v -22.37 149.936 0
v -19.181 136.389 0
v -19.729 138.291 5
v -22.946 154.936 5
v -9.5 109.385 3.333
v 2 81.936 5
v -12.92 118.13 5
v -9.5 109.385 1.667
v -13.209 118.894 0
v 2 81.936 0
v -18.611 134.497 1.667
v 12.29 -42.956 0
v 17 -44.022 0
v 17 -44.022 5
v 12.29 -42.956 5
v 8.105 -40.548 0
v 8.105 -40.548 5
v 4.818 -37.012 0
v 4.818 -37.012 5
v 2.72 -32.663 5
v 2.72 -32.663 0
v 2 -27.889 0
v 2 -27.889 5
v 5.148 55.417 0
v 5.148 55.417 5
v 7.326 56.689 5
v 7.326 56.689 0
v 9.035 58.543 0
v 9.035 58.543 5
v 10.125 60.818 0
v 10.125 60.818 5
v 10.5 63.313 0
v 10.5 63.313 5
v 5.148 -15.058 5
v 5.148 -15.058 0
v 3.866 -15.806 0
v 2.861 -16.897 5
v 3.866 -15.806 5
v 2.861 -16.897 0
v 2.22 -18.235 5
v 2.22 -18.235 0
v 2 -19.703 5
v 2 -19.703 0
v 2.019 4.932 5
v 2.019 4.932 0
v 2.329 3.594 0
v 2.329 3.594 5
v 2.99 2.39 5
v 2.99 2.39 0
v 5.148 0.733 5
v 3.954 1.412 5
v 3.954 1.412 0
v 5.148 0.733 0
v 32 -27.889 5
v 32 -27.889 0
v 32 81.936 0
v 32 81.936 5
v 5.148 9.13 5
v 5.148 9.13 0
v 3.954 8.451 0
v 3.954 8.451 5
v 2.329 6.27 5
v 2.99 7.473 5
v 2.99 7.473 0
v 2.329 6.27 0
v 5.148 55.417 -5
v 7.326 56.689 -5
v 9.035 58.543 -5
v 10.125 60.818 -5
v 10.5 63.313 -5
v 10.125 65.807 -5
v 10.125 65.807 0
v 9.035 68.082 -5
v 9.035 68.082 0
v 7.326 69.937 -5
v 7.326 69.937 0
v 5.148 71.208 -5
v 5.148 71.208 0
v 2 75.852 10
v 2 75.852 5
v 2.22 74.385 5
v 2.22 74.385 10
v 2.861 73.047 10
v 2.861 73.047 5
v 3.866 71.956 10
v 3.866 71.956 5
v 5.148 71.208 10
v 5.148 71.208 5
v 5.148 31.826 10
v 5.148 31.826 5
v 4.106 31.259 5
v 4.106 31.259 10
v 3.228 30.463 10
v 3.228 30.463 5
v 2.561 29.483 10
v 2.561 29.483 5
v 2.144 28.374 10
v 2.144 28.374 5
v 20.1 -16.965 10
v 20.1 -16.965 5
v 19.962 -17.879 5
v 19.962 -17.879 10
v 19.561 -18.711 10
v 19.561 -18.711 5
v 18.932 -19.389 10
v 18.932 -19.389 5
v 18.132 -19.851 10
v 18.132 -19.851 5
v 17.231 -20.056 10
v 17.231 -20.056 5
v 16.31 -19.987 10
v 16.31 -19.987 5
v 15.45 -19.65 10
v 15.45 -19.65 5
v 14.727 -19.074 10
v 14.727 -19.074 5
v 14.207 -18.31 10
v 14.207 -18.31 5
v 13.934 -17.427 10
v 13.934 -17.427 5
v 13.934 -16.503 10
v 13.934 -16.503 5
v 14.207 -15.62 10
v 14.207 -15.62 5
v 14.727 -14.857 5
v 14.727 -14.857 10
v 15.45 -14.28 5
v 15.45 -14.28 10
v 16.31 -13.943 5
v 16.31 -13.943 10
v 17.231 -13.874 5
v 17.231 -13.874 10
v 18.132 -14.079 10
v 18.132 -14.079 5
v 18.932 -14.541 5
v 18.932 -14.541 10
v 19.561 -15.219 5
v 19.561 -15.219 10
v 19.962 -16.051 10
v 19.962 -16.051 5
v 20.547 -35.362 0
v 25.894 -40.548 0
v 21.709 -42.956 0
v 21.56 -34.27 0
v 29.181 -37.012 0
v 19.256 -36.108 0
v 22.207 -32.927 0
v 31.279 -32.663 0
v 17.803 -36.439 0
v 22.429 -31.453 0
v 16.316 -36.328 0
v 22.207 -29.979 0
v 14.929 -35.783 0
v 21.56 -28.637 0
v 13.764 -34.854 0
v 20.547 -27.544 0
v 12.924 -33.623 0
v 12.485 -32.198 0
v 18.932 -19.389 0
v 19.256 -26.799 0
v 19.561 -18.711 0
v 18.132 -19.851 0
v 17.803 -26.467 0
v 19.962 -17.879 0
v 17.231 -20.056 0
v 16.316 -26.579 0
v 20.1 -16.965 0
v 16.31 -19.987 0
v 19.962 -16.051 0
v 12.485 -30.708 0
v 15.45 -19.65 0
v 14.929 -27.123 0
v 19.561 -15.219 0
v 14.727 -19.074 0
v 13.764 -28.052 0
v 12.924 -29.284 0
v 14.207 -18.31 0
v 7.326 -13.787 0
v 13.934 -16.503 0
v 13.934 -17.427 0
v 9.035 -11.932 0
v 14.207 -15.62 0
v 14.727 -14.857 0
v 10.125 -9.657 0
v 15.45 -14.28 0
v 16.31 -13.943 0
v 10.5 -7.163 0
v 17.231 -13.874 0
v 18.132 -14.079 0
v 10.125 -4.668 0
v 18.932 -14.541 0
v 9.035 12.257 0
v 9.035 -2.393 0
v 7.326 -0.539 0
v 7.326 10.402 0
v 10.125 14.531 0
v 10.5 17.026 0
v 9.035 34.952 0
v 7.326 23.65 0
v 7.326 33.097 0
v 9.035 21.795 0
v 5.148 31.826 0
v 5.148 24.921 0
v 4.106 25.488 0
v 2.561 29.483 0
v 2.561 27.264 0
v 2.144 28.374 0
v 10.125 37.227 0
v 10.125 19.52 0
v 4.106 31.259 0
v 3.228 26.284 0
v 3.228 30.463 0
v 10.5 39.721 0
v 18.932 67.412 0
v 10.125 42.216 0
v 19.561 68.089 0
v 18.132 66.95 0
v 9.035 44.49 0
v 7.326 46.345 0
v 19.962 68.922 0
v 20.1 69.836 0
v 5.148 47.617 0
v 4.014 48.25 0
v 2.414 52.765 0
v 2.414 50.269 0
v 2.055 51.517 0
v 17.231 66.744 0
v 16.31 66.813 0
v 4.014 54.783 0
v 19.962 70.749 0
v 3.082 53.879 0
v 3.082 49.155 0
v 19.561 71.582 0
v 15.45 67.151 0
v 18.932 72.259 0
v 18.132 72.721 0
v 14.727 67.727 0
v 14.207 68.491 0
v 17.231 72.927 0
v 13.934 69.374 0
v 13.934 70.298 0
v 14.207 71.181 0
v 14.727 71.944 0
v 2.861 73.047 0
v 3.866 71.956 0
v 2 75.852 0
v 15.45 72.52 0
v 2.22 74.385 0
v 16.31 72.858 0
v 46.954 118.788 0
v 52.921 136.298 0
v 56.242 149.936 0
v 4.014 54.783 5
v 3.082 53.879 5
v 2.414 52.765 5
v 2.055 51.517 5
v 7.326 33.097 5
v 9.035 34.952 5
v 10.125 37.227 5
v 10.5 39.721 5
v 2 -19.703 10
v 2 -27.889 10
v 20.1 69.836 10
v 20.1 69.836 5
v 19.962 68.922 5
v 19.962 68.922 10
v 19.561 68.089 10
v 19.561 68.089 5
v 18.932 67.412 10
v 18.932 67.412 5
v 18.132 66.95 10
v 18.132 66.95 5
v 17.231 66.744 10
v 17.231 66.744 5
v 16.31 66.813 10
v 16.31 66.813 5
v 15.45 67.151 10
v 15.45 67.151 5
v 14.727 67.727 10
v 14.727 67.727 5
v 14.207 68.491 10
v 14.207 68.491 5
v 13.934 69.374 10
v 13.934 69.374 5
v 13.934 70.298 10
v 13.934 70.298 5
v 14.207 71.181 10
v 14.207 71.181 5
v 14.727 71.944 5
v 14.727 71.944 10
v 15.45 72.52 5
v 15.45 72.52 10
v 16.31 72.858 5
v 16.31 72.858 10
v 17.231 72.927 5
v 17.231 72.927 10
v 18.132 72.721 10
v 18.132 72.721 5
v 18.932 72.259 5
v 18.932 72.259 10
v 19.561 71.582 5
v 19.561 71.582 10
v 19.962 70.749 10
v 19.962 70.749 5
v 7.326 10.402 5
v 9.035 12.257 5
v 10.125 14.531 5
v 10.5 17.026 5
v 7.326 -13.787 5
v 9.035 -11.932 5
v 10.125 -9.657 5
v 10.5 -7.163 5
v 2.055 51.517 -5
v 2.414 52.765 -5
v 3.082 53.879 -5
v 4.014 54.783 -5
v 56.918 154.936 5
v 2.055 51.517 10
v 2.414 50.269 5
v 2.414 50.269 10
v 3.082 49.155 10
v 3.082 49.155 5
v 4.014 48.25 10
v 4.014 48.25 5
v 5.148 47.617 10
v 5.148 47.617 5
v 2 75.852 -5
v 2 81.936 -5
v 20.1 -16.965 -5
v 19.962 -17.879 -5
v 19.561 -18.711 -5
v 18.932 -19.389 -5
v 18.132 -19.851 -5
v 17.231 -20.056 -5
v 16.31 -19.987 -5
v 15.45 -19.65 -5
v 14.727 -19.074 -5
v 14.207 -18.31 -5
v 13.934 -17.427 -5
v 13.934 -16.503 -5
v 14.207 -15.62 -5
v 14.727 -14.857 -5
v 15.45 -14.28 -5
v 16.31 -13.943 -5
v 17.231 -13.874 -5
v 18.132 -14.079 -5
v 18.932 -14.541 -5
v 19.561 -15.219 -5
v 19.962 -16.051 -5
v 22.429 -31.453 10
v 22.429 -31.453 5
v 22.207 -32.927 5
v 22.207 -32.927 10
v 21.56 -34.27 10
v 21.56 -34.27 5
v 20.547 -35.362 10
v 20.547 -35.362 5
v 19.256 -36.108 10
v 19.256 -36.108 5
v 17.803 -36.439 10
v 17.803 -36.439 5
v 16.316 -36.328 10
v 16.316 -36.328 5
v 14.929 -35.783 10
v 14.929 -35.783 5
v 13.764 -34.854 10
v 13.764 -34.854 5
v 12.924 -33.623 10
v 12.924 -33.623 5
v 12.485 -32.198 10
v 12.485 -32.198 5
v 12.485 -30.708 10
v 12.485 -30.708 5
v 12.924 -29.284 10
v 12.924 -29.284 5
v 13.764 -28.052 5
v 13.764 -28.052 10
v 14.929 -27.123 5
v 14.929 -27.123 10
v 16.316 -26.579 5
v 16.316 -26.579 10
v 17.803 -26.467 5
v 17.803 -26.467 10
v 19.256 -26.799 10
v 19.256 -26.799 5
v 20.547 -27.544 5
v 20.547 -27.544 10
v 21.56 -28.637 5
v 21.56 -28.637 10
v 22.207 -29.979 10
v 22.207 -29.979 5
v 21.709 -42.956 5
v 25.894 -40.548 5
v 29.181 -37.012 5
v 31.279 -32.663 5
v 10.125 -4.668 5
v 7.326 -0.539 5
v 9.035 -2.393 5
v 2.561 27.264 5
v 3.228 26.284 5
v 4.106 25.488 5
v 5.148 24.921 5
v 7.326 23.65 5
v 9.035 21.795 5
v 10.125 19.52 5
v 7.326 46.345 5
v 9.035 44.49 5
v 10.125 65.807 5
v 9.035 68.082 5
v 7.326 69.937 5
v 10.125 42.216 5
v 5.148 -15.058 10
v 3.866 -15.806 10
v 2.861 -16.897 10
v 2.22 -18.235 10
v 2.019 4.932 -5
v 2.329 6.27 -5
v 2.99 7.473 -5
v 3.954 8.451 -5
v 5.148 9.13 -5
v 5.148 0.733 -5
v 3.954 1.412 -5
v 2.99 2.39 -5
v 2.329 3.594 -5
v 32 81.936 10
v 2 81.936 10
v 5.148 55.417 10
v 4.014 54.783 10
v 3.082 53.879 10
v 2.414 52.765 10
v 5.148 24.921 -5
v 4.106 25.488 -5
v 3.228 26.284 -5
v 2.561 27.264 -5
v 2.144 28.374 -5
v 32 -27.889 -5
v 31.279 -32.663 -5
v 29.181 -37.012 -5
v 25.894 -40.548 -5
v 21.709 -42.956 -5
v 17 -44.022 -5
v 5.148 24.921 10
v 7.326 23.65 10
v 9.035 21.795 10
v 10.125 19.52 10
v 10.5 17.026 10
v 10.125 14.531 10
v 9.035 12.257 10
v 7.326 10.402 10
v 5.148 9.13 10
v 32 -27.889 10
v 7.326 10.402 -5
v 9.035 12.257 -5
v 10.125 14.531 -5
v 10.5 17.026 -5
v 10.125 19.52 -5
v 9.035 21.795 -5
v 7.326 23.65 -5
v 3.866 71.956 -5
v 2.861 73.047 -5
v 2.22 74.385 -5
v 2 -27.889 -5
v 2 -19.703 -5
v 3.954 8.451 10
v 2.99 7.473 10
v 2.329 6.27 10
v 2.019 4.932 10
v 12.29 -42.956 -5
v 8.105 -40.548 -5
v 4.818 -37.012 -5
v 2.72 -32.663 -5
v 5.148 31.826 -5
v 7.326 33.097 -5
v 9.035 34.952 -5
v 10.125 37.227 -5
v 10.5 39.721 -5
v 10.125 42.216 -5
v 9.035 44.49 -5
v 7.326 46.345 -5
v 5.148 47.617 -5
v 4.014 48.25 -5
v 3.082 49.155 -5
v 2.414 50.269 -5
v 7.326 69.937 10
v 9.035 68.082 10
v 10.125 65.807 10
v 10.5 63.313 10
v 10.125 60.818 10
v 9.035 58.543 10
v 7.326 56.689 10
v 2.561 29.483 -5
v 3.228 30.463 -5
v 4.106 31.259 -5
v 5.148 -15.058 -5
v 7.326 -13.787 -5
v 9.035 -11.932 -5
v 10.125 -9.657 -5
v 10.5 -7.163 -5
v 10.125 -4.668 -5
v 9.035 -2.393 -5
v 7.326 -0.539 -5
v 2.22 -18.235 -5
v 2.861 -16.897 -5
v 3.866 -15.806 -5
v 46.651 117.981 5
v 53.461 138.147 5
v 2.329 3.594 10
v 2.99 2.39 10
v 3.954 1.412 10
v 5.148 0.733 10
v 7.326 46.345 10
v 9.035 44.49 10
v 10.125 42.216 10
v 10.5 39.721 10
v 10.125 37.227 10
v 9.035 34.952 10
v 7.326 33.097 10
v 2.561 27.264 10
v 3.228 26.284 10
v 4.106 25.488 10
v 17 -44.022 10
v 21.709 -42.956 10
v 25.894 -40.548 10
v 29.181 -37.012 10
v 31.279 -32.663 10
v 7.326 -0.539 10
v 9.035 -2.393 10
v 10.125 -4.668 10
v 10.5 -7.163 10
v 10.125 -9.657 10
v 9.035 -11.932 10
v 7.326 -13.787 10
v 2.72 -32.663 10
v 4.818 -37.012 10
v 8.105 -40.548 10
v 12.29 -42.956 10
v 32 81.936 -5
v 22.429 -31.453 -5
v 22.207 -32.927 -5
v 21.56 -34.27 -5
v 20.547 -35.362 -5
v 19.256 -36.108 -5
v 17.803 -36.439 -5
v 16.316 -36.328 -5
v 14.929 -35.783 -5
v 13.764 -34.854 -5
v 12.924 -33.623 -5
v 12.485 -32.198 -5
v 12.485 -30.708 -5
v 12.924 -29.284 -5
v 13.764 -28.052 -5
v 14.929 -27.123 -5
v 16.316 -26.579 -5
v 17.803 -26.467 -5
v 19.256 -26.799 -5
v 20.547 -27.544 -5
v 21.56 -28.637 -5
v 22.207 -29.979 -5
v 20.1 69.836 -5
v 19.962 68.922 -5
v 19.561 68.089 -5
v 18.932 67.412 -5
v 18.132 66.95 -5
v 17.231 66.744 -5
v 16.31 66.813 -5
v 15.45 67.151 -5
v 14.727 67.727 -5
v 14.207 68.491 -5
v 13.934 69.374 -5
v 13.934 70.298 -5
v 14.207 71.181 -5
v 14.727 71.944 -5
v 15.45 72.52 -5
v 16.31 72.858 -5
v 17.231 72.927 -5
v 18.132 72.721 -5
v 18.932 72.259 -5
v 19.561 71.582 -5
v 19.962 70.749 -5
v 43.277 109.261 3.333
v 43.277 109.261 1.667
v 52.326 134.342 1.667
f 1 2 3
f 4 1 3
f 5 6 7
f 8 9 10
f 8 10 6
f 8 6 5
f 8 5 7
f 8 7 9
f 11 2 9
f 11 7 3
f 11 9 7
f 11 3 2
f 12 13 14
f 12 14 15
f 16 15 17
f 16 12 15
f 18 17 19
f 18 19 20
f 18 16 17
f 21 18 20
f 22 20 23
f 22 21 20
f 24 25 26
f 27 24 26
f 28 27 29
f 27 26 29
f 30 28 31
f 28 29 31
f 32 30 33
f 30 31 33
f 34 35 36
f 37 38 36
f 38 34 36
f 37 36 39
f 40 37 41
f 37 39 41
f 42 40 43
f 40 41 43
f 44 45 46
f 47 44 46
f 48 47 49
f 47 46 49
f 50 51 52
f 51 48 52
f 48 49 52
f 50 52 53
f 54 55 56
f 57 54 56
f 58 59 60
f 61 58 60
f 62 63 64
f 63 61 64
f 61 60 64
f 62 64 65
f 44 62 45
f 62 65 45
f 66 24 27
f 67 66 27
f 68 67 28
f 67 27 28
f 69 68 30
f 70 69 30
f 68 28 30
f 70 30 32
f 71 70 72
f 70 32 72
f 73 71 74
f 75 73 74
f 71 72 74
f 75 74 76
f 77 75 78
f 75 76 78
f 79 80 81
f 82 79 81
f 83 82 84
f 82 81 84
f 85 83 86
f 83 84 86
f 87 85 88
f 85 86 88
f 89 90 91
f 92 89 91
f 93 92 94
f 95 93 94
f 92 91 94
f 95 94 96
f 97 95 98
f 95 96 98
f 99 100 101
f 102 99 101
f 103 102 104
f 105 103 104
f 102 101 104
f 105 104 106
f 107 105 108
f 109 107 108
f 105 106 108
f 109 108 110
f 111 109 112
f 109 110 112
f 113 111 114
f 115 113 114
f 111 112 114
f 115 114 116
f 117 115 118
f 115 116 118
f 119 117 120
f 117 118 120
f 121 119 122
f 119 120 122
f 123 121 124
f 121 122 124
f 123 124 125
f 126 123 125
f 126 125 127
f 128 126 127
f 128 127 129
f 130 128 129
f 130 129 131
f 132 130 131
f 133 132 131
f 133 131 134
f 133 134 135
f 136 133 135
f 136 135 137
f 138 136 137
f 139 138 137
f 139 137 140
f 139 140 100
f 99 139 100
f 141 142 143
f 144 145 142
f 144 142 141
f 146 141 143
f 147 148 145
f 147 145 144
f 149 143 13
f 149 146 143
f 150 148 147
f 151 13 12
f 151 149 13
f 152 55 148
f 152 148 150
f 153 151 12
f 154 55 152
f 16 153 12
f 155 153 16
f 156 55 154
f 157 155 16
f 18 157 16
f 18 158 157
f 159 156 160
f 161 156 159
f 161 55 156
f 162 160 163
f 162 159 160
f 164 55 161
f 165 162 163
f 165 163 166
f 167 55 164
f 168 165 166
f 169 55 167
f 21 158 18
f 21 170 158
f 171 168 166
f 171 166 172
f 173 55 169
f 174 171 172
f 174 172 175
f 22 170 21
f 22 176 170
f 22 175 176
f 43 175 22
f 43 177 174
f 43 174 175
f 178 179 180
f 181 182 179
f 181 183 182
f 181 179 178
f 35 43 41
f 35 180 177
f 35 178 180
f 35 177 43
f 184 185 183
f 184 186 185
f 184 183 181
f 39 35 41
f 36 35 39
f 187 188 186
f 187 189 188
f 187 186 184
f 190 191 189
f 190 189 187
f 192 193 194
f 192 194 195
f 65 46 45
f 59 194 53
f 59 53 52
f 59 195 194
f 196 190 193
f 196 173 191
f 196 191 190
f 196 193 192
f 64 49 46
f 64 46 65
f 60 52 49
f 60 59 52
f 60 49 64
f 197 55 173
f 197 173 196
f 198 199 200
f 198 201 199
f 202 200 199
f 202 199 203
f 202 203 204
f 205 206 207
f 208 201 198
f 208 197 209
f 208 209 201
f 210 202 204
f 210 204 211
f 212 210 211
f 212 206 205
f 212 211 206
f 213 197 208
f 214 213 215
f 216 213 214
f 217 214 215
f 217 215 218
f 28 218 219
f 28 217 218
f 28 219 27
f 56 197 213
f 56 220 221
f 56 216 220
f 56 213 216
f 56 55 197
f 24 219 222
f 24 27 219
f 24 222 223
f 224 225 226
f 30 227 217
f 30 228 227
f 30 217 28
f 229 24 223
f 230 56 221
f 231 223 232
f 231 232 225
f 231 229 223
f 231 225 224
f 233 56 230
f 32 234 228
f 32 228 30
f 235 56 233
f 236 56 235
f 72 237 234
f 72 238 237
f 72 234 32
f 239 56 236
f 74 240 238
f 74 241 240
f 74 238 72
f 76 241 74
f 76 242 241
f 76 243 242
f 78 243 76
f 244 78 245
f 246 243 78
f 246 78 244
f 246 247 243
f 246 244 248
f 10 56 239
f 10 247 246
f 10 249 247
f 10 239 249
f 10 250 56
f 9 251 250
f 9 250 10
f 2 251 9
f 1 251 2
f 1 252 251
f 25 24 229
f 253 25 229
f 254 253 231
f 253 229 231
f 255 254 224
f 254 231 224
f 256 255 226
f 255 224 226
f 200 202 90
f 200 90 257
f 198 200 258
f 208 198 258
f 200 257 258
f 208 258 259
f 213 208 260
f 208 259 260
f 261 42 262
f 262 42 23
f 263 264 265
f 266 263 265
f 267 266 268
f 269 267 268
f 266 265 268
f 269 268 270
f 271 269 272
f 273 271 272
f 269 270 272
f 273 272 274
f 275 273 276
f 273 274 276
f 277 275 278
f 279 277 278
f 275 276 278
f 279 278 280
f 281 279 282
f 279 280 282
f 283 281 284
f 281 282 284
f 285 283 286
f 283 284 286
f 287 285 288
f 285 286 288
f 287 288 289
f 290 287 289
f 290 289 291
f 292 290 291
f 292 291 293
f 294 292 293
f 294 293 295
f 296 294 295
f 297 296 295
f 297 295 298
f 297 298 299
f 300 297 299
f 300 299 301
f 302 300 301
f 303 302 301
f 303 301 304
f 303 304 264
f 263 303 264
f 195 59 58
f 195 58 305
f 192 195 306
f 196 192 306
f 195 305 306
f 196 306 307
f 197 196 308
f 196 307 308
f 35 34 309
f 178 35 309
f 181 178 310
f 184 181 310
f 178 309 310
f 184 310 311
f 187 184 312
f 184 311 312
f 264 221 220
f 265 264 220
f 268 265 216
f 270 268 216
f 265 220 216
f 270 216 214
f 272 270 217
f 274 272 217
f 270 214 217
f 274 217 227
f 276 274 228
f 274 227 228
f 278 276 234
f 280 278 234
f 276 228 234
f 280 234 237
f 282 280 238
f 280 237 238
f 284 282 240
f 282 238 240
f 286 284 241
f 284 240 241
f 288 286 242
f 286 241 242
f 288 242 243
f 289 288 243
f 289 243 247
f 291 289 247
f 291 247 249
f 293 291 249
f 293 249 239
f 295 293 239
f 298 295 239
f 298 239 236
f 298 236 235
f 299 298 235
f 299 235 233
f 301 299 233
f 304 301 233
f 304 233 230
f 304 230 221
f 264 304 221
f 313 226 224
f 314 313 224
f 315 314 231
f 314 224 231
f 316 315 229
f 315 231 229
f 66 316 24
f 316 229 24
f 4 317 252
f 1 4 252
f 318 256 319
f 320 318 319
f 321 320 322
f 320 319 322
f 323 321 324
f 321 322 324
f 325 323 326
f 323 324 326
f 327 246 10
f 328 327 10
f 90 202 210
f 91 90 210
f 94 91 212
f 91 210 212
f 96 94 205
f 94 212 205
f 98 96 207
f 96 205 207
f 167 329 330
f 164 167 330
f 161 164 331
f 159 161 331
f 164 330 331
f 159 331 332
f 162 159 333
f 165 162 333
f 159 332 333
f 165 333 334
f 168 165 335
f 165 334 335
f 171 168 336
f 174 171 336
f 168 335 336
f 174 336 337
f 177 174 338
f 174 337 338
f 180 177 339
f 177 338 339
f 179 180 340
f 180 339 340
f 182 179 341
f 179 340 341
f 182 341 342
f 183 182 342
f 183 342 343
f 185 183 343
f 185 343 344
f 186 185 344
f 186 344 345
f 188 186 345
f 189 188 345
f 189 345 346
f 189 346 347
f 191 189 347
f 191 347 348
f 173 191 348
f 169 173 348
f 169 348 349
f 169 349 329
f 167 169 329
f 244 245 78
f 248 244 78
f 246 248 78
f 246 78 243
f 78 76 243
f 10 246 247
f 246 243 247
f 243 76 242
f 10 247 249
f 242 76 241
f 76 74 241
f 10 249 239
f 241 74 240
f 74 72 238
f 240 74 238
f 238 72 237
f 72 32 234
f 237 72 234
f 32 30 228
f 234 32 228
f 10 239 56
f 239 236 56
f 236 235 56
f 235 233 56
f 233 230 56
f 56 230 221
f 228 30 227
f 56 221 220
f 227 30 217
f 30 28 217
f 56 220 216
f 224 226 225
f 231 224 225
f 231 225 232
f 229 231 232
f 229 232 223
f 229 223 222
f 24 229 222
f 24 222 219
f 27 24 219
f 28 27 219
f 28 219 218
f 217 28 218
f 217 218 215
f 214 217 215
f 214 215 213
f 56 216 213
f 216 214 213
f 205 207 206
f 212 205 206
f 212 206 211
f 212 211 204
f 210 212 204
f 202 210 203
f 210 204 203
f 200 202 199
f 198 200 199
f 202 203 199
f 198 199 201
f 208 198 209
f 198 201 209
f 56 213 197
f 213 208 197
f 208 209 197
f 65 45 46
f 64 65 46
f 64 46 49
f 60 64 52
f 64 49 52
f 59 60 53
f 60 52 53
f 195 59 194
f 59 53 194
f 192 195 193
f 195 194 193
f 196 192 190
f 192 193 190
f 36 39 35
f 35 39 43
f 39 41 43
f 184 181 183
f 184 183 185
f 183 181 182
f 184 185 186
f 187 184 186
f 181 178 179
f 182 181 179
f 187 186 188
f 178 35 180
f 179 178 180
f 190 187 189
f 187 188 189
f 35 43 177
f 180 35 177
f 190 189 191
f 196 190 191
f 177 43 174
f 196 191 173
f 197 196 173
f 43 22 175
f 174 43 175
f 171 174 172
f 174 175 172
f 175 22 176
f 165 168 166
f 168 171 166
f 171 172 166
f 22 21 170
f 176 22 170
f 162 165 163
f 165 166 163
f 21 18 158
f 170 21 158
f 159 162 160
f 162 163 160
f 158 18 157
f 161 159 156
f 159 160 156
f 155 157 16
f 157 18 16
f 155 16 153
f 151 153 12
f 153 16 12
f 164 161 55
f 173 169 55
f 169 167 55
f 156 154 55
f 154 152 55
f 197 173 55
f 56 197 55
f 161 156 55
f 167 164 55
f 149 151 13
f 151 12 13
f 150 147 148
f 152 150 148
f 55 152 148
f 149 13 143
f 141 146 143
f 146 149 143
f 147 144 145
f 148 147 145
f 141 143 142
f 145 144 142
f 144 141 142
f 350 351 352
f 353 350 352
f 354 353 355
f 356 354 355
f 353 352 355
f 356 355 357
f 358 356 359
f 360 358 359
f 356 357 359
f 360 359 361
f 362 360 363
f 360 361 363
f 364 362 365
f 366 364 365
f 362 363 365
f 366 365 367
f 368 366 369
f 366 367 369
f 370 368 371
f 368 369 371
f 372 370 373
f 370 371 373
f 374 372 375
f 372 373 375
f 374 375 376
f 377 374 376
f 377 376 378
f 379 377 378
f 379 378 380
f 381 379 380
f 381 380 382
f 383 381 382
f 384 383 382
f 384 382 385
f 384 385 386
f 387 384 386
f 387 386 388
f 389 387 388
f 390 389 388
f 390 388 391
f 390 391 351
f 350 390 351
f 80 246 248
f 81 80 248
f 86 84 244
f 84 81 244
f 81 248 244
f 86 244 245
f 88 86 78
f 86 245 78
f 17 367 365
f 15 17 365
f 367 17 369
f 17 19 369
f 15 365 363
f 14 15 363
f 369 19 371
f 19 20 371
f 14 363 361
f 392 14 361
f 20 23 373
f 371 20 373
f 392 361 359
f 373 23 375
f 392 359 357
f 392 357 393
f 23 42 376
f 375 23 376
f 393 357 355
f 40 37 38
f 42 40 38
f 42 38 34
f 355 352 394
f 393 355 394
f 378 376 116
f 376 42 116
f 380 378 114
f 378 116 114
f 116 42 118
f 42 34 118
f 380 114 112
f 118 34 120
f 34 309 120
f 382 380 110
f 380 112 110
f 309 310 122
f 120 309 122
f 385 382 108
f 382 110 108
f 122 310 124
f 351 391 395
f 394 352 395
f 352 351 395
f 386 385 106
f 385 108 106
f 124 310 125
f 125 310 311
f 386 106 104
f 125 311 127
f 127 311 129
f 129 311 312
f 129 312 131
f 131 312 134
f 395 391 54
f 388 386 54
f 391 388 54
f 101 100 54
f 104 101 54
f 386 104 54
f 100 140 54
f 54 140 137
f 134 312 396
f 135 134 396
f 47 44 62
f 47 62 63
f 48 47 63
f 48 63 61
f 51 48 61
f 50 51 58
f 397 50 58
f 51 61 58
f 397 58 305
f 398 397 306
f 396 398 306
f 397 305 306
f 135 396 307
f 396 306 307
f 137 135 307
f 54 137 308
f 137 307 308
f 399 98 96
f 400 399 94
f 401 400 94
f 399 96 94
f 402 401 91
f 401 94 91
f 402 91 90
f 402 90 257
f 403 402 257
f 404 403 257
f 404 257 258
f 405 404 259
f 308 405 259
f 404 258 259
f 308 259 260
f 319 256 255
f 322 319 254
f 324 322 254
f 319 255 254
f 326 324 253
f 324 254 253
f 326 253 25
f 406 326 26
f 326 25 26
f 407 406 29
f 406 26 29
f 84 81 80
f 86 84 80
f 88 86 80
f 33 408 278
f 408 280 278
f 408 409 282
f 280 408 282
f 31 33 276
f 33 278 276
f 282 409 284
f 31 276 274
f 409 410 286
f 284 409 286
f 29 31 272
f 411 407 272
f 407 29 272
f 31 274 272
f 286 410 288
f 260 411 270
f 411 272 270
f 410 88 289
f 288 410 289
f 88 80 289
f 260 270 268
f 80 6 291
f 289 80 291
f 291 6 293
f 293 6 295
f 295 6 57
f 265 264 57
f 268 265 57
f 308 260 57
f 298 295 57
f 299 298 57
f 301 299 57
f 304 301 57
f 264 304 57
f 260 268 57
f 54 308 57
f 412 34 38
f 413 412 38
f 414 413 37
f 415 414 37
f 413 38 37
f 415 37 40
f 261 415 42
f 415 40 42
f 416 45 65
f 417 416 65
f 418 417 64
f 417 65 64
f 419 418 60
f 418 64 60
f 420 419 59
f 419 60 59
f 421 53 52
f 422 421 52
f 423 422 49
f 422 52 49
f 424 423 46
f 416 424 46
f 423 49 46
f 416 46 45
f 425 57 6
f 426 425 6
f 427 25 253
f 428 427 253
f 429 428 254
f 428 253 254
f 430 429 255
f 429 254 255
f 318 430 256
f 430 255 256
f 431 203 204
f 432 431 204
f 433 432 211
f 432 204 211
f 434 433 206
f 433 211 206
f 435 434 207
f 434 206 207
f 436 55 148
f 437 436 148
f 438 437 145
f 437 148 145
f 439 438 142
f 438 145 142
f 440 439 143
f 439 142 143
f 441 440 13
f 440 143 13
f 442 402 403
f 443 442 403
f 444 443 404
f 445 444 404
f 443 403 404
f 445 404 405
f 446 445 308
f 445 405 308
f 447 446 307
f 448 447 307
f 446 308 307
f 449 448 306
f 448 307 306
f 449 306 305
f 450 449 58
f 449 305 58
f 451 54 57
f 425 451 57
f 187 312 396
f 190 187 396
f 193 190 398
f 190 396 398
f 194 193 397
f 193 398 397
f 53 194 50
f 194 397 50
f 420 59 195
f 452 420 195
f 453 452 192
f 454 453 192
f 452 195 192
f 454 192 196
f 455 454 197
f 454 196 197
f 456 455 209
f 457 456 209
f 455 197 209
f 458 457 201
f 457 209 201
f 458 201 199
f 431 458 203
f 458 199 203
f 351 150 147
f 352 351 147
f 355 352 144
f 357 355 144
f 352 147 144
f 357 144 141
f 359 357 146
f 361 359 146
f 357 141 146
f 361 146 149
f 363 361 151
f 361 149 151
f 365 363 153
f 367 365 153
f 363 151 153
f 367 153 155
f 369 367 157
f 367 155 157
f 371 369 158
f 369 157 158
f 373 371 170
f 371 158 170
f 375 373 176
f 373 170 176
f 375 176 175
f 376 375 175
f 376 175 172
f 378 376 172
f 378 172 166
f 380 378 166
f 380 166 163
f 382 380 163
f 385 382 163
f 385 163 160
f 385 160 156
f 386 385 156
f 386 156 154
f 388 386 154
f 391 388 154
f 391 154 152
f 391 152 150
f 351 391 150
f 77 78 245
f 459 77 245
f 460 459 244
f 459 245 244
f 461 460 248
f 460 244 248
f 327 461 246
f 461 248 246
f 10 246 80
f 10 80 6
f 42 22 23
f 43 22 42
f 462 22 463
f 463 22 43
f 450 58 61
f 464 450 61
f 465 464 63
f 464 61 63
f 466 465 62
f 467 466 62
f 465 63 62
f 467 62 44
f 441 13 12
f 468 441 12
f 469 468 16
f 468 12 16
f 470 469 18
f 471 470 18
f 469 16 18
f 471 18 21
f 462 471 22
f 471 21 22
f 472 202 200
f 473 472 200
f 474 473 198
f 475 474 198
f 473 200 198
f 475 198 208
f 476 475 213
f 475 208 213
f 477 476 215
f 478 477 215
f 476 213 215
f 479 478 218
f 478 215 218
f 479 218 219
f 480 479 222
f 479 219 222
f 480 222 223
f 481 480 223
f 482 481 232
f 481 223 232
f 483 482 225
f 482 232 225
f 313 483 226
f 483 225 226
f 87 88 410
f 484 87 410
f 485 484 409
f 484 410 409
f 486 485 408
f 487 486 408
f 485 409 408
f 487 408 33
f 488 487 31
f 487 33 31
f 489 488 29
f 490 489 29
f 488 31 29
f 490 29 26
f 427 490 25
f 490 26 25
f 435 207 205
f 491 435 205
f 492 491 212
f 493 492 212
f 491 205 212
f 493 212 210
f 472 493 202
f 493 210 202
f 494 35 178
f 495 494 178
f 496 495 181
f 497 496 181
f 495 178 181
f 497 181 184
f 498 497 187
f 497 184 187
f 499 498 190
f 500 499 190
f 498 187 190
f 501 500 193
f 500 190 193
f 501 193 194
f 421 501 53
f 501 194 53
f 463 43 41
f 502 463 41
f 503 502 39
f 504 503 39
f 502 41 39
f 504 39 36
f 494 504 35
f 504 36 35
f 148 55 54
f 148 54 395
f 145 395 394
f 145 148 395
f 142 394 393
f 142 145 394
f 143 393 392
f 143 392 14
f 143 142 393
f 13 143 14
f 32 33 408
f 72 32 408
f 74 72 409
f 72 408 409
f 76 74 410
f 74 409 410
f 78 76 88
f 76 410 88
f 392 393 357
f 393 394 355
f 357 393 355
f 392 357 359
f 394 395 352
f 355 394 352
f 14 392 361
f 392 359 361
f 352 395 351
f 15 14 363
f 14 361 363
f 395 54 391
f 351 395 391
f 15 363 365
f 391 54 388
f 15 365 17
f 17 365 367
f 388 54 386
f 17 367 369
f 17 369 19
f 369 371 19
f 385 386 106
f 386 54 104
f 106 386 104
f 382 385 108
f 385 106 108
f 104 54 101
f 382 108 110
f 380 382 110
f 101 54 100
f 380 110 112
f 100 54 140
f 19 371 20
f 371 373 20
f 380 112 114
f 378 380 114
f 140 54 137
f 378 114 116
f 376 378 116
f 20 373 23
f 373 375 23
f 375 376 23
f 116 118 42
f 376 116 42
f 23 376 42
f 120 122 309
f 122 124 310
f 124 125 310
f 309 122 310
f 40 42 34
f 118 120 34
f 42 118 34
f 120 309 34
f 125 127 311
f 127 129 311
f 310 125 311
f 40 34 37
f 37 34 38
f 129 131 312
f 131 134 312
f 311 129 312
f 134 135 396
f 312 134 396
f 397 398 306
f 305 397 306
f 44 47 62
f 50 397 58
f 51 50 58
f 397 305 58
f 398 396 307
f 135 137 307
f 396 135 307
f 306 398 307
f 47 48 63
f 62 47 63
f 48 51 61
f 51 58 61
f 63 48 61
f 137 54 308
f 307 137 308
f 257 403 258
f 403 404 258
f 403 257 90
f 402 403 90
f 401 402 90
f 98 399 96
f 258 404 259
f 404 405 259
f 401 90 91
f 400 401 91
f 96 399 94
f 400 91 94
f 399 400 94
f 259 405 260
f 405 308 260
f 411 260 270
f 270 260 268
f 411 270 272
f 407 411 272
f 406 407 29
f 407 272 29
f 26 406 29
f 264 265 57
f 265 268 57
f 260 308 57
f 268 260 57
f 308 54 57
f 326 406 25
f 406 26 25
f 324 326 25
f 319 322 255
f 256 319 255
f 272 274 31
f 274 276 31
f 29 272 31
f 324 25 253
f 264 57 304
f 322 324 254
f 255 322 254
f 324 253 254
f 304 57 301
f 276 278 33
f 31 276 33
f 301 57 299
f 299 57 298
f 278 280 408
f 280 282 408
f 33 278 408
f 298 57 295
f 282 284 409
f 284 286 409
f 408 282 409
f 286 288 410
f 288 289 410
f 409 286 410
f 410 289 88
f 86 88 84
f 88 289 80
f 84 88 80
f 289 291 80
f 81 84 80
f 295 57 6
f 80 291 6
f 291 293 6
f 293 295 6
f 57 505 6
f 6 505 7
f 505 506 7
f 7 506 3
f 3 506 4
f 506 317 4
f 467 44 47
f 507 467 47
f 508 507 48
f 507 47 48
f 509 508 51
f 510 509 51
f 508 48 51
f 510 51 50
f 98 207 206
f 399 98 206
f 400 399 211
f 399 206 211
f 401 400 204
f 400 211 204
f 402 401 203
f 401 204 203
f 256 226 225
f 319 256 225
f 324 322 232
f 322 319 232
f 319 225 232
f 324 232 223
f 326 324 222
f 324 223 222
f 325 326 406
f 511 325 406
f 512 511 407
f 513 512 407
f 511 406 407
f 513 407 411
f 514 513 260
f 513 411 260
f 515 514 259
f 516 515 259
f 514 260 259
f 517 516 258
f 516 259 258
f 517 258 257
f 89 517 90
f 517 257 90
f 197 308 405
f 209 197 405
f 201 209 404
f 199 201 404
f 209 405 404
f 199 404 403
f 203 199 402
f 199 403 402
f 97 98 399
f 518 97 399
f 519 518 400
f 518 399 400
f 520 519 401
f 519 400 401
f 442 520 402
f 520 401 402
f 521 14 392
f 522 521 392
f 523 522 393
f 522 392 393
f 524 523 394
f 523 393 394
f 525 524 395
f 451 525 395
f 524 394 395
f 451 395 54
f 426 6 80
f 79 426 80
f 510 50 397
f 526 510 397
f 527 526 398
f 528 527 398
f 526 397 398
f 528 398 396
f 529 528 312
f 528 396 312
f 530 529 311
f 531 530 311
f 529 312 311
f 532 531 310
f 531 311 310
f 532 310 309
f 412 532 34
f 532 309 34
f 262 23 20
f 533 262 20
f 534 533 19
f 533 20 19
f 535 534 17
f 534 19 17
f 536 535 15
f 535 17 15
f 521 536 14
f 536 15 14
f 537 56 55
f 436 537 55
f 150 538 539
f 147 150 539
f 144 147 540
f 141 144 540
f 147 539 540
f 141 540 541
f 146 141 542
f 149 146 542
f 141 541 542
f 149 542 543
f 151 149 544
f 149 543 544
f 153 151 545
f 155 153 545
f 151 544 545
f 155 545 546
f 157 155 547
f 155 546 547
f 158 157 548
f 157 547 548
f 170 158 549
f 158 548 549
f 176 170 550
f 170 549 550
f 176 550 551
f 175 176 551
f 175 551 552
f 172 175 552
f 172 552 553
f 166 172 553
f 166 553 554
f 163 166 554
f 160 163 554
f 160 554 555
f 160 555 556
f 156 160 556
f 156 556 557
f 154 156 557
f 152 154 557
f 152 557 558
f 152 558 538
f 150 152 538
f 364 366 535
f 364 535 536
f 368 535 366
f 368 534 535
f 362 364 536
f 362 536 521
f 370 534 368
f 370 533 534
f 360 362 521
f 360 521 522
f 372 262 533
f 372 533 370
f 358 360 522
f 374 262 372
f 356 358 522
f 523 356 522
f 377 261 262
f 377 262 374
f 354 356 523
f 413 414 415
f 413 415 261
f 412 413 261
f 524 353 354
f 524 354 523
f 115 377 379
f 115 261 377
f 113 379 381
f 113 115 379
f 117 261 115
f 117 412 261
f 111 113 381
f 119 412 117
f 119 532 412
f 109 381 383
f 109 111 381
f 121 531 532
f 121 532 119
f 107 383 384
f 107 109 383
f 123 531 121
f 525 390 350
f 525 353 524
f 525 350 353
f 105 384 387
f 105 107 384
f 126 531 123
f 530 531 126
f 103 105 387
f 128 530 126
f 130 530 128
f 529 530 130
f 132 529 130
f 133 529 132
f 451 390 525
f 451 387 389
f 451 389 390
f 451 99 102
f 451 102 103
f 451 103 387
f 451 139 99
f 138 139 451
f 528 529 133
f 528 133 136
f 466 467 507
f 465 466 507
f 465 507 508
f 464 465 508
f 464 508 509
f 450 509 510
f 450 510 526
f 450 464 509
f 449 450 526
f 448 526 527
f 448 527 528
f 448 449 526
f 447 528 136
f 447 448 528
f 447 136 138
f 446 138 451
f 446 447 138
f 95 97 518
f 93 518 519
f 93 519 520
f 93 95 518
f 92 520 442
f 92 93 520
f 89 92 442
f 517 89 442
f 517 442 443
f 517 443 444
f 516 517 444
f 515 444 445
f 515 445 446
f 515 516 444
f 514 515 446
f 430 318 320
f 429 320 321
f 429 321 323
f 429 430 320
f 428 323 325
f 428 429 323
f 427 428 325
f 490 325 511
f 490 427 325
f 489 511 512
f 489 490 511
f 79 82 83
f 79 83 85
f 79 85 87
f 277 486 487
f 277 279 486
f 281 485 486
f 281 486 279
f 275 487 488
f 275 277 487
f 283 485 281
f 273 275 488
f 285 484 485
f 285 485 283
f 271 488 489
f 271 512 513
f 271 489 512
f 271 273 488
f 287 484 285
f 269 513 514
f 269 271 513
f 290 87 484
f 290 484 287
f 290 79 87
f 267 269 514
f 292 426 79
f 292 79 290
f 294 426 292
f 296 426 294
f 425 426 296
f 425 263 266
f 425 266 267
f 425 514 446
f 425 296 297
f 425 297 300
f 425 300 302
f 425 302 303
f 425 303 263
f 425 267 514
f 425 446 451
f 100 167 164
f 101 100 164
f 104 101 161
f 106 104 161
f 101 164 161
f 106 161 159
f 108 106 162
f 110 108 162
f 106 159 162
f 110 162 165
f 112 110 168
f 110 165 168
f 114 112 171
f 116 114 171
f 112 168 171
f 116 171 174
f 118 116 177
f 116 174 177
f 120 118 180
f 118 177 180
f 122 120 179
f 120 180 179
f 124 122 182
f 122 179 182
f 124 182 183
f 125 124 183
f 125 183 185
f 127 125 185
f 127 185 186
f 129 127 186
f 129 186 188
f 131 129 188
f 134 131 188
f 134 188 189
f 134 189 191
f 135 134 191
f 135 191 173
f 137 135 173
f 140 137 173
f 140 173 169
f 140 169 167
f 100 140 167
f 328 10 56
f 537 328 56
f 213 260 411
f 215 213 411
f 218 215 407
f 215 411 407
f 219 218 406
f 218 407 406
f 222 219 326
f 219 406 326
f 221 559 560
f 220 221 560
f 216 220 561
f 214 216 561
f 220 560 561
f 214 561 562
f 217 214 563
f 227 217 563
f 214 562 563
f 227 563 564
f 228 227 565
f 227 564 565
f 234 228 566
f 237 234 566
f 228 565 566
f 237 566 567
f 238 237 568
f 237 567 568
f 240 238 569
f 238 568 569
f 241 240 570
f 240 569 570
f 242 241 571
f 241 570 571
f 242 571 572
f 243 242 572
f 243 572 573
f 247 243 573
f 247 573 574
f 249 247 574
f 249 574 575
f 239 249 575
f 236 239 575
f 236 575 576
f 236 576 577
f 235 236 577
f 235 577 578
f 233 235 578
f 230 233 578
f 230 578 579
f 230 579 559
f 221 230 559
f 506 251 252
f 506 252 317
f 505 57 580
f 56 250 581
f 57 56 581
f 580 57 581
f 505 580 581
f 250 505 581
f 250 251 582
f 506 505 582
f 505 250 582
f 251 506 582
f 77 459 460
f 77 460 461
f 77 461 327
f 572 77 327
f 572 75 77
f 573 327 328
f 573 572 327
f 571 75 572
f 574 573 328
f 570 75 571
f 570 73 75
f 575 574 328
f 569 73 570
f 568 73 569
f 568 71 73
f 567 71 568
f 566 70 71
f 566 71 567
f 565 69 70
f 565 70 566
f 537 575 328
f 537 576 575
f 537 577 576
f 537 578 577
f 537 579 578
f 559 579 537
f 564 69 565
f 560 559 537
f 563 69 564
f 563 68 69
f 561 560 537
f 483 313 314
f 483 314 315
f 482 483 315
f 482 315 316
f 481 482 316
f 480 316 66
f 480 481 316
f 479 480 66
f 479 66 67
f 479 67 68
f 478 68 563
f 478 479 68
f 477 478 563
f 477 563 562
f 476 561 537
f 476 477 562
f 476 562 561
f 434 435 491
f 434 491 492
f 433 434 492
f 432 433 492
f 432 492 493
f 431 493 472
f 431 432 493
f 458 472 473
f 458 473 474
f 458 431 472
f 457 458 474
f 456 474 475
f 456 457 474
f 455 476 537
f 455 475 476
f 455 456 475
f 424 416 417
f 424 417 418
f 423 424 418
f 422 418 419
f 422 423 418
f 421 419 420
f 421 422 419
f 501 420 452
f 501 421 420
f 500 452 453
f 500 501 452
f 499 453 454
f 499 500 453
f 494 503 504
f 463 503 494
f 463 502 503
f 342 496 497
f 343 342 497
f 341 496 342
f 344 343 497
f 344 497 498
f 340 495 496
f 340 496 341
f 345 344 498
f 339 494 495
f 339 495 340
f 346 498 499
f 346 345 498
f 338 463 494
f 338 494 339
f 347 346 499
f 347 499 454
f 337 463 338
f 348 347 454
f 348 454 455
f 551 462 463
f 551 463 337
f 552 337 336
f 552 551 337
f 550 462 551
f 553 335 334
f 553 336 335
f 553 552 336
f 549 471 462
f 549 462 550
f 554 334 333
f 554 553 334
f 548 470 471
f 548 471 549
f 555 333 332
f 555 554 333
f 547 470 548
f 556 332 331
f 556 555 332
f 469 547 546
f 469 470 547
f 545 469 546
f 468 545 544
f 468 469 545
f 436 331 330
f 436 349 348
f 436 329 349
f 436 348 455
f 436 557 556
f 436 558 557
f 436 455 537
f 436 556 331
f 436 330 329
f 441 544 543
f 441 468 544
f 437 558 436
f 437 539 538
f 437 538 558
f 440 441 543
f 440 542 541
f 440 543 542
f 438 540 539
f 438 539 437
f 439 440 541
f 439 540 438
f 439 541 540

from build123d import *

# Parameters (mm, degrees)
F0_W         = 30
F0_H         = 126
F1_DEPTH     = 5
F2_T1_DEPTH  = 85.8761543395
F4_DEPTH     = 25
F5_T1_DEPTH  = 25.1996810199
F7_DEPTH     = 5
F9_DEPTH     = 5
F10_T1_DEPTH = 110.8601958556
F11_R        = 3.1
F11_R_2      = 5
F12_DEPTH    = 83.8


# Not quite as in the source:
# - a fillet or chamfer that OpenCascade refuses, or shapes differently, is made with other operations: its cross-section is extruded or revolved along the edge and cut away or added


with BuildPart() as f1:
    # F0 (on Top) → F1 (new body)
    with BuildSketch(Plane.XY):
        with BuildLine():
            add(Edge.make_bspline(
                [(1.999508217, 81.9356532991), (-10.1294136818, 110.3160546729), (-22.2583355805, 138.6964560467), (-23.000491783, 155.9356532991)],
                knots=[0, 0, 0, 0, 0.6549279326, 0.6549279326, 0.6549279326, 0.6549279326], degree=3))
            Line((1.999508217, 81.9356532991), (31.999508217, 81.9356532991))
            add(Edge.make_bspline(
                [(31.999508217, 81.9356532991), (43.8717951109, 110.1652859419), (55.7440820049, 138.3949185848), (56.999508217, 155.9356532991)],
                knots=[0, 0, 0, 0, 0.6510604818, 0.6510604818, 0.6510604818, 0.6510604818], degree=3))
            Line((56.999508217, 155.9356532991), (-23.000491783, 155.9356532991))
        make_face()
        with Locations((16.999508217, 18.9356532991)):
            Rectangle(F0_W, F0_H)
    extrude(amount=F1_DEPTH)

    # F2: fillet of radius 16.1752308679 on 2 edges, made by hand

    # F2_s2 → F2_t1 (cut)
    with BuildSketch(Plane.XY.offset(-40.4380771697)):
        with BuildLine():
            ThreePointArc((18.1747390849, -44.0643467009), (6.7371236509, -39.326731267), (1.999508217, -27.889115833))
            Line((1.999508217, -27.889115833), (1.999508217, -44.0643467009))
            Line((1.999508217, -44.0643467009), (18.1747390849, -44.0643467009))
        make_face()
        with BuildLine():
            ThreePointArc((31.999508217, -27.889115833), (27.261892783, -39.326731267), (15.8242773491, -44.0643467009))
            Line((15.8242773491, -44.0643467009), (31.999508217, -44.0643467009))
            Line((31.999508217, -44.0643467009), (31.999508217, -27.889115833))
        make_face()
    extrude(amount=F2_T1_DEPTH, mode=Mode.SUBTRACT)

    # F3 (on face) → F4 (cut)
    with BuildSketch(Plane.XY.offset(5)):
        with BuildLine():
            ThreePointArc((10.499508217, -7.1626533754), (8.0099158571, -1.1522457353), (1.999508217, 1.3373466246))
            Line((1.999508217, 1.3373466246), (1.999508217, -15.6626533754))
            ThreePointArc((1.999508217, -15.6626533754), (8.0099158571, -13.1730610155), (10.499508217, -7.1626533754))
        make_face()
        with BuildLine():
            ThreePointArc((10.499508217, 17.0258656144), (8.0099158571, 23.0362732545), (1.999508217, 25.5258656144))
            Line((1.999508217, 25.5258656144), (1.999508217, 8.5258656144))
            ThreePointArc((1.999508217, 8.5258656144), (8.0099158571, 11.0154579743), (10.499508217, 17.0258656144))
        make_face()
        with BuildLine():
            ThreePointArc((10.499508217, 39.7212654352), (8.0099158571, 45.7316730753), (1.999508217, 48.2212654352))
            Line((1.999508217, 48.2212654352), (1.999508217, 31.2212654352))
            ThreePointArc((1.999508217, 31.2212654352), (8.0099158571, 33.7108577951), (10.499508217, 39.7212654352))
        make_face()
        with BuildLine():
            ThreePointArc((1.999508217, 54.8125379682), (8.0099158571, 57.3021303281), (10.499508217, 63.3125379682))
            ThreePointArc((10.499508217, 63.3125379682), (8.0099158571, 69.3229456082), (1.999508217, 71.8125379682))
            Line((1.999508217, 71.8125379682), (1.999508217, 54.8125379682))
        make_face()
    extrude(amount=-F4_DEPTH, mode=Mode.SUBTRACT)

    # F5: fillet of radius 5 on 8 edges, made by hand

    # F5_s2 → F5_t1 (cut)
    with BuildSketch(Plane.XY.offset(-10.09984051)):
        with BuildLine():
            ThreePointArc((5.1476563651, -15.0581687631), (2.8607125432, -16.897171541), (1.999508217, -19.7025895794))
            Line((1.999508217, -19.7025895794), (1.999508217, -15.6626533754))
            ThreePointArc((1.999508217, -15.6626533754), (3.6023368423, -15.5101644055), (5.1476563651, -15.0581687631))
        make_face()
        with BuildLine():
            ThreePointArc((1.999508217, 5.3772828286), (2.8607125432, 2.5718647901), (5.1476563651, 0.7328620123))
            ThreePointArc((5.1476563651, 0.7328620123), (3.6023368423, 1.1848576547), (1.999508217, 1.3373466246))
            Line((1.999508217, 1.3373466246), (1.999508217, 5.3772828286))
        make_face()
        with BuildLine():
            ThreePointArc((5.1476563651, 9.1303502267), (2.8607125432, 7.2913474489), (1.999508217, 4.4859294104))
            Line((1.999508217, 4.4859294104), (1.999508217, 8.5258656144))
            ThreePointArc((1.999508217, 8.5258656144), (3.6023368423, 8.6783545843), (5.1476563651, 9.1303502267))
        make_face()
        with BuildLine():
            ThreePointArc((1.999508217, 29.5658018184), (2.8607125432, 26.76038378), (5.1476563651, 24.9213810021))
            ThreePointArc((5.1476563651, 24.9213810021), (3.6023368423, 25.3733766445), (1.999508217, 25.5258656144))
            Line((1.999508217, 25.5258656144), (1.999508217, 29.5658018184))
        make_face()
        with BuildLine():
            ThreePointArc((5.1476563651, 31.8257500475), (2.8607125432, 29.9867472697), (1.999508217, 27.1813292312))
            Line((1.999508217, 27.1813292312), (1.999508217, 31.2212654352))
            ThreePointArc((1.999508217, 31.2212654352), (3.6023368423, 31.3737544051), (5.1476563651, 31.8257500475))
        make_face()
        with BuildLine():
            ThreePointArc((1.999508217, 52.2612016392), (2.8607125432, 49.4557836008), (5.1476563651, 47.6167808229))
            ThreePointArc((5.1476563651, 47.6167808229), (3.6023368423, 48.0687764653), (1.999508217, 48.2212654352))
            Line((1.999508217, 48.2212654352), (1.999508217, 52.2612016392))
        make_face()
        with BuildLine():
            ThreePointArc((5.1476563651, 55.4170225805), (2.8607125432, 53.5780198026), (1.999508217, 50.7726017642))
            Line((1.999508217, 50.7726017642), (1.999508217, 54.8125379682))
            ThreePointArc((1.999508217, 54.8125379682), (3.6023368423, 54.9650269381), (5.1476563651, 55.4170225805))
        make_face()
        with BuildLine():
            ThreePointArc((1.999508217, 75.8524741721), (2.8607125432, 73.0470561337), (5.1476563651, 71.2080533559))
            ThreePointArc((5.1476563651, 71.2080533559), (3.6023368423, 71.6600489983), (1.999508217, 71.8125379682))
            Line((1.999508217, 71.8125379682), (1.999508217, 75.8524741721))
        make_face()
    extrude(amount=F5_T1_DEPTH, mode=Mode.SUBTRACT)

    # F10: chamfer of 6 on 1 edges, made by hand

    # F10_s2 → F10_t1 (cut)
    with BuildSketch(Plane.YZ.offset(-38.4305897108)):
        Polygon((155.9356532991, 6), (149.9356532991, 0), (155.9356532991, 0), align=None)
    extrude(amount=F10_T1_DEPTH, mode=Mode.SUBTRACT)


with BuildPart() as f7:
    # F6 (on face) → F7 (new body)
    with BuildSketch(Plane.XY.offset(5)):
        with BuildLine():
            Line((31.999508217, 81.9356532991), (1.999508217, 81.9356532991))
            Line((1.999508217, 81.9356532991), (1.999508217, 75.8524741721))
            ThreePointArc((1.999508217, 75.8524741721), (2.8607125432, 73.0470561337), (5.1476563651, 71.2080533559))
            ThreePointArc((5.1476563651, 71.2080533559), (10.499508217, 63.3125379682), (5.1476563651, 55.4170225805))
            ThreePointArc((5.1476563651, 55.4170225805), (3.0816482724, 53.8791067866), (2.0552168014, 51.5169017017))
            ThreePointArc((2.0552168014, 51.5169017017), (3.0816482724, 49.1546966168), (5.1476563651, 47.6167808229))
            ThreePointArc((5.1476563651, 47.6167808229), (10.499508217, 39.7212654352), (5.1476563651, 31.8257500475))
            ThreePointArc((5.1476563651, 31.8257500475), (3.227576814, 30.4634830197), (2.1437309754, 28.3735655249))
            ThreePointArc((2.1437309754, 28.3735655249), (3.227576814, 26.2836480299), (5.1476563651, 24.9213810021))
            ThreePointArc((5.1476563651, 24.9213810021), (10.499508217, 17.0258656144), (5.1476563651, 9.1303502267))
            ThreePointArc((5.1476563651, 9.1303502267), (2.989988744, 7.4731946473), (2.0194106004, 4.9316061195))
            ThreePointArc((2.0194106004, 4.9316061195), (2.989988744, 2.3900175917), (5.1476563651, 0.7328620123))
            ThreePointArc((5.1476563651, 0.7328620123), (10.499508217, -7.1626533754), (5.1476563651, -15.0581687631))
            ThreePointArc((5.1476563651, -15.0581687631), (2.8607125432, -16.897171541), (1.999508217, -19.7025895794))
            Line((1.999508217, -19.7025895794), (1.999508217, -27.889115833))
            ThreePointArc((1.999508217, -27.889115833), (6.3289017518, -38.9033898222), (16.9995082169, -44.0215963006))
            ThreePointArc((16.9995082169, -44.0215963006), (27.6701146821, -38.9033898222), (31.999508217, -27.889115833))
            Line((31.999508217, -27.889115833), (31.999508217, 81.9356532991))
        make_face()
    extrude(amount=F7_DEPTH)


with BuildPart() as f9:
    # F8 (on face) → F9 (new body)
    with BuildSketch(Plane(origin=(0, 0, 0), x_dir=(1, 0, 0), z_dir=(0, 0, -1))):
        with BuildLine():
            Line((1.999508217, -75.8524741721), (1.999508217, -81.9356532991))
            Line((1.999508217, -81.9356532991), (31.999508217, -81.9356532991))
            Line((31.999508217, -81.9356532991), (31.999508217, 27.889115833))
            ThreePointArc((31.999508217, 27.889115833), (27.6701146821, 38.9033898222), (16.9995082169, 44.0215963006))
            ThreePointArc((16.9995082169, 44.0215963006), (6.3289017518, 38.9033898222), (1.999508217, 27.889115833))
            Line((1.999508217, 27.889115833), (1.999508217, 19.7025895794))
            ThreePointArc((1.999508217, 19.7025895794), (2.8607125432, 16.897171541), (5.1476563651, 15.0581687631))
            ThreePointArc((5.1476563651, 15.0581687631), (10.499508217, 7.1626533754), (5.1476563651, -0.7328620123))
            ThreePointArc((5.1476563651, -0.7328620123), (2.989988744, -2.3900175917), (2.0194106004, -4.9316061195))
            ThreePointArc((2.0194106004, -4.9316061195), (2.989988744, -7.4731946473), (5.1476563651, -9.1303502267))
            ThreePointArc((5.1476563651, -9.1303502267), (10.499508217, -17.0258656144), (5.1476563651, -24.9213810021))
            ThreePointArc((5.1476563651, -24.9213810021), (3.227576814, -26.2836480299), (2.1437309754, -28.3735655249))
            ThreePointArc((2.1437309754, -28.3735655249), (3.227576814, -30.4634830197), (5.1476563651, -31.8257500475))
            ThreePointArc((5.1476563651, -31.8257500475), (10.499508217, -39.7212654352), (5.1476563651, -47.6167808229))
            ThreePointArc((5.1476563651, -47.6167808229), (3.0816482724, -49.1546966168), (2.0552168014, -51.5169017017))
            ThreePointArc((2.0552168014, -51.5169017017), (3.0816482724, -53.8791067866), (5.1476563651, -55.4170225805))
            ThreePointArc((5.1476563651, -55.4170225805), (10.499508217, -63.3125379682), (5.1476563651, -71.2080533559))
            ThreePointArc((5.1476563651, -71.2080533559), (2.8607125432, -73.0470561337), (1.999508217, -75.8524741721))
        make_face()
    extrude(amount=F9_DEPTH)


with BuildPart() as f12_tool:
    # F11 (on face) → F12 (new body)
    with BuildSketch(Plane(origin=(0, 0, -5), x_dir=(1, 0, 0), z_dir=(0, 0, -1))):
        with Locations((16.999508217, -69.8356532991)):
            Circle(F11_R)
        with Locations((16.999508217, 16.9651284814)):
            Circle(F11_R)
        with Locations((17.429100106, 31.4532717611)):
            Circle(F11_R_2)
    extrude(amount=-F12_DEPTH)


with BuildPart() as f1_1:
    add(f1.part)

    # F12: cut by f12_tool
    add(f12_tool.part, mode=Mode.SUBTRACT)


with BuildPart() as f7_1:
    add(f7.part)

    # F12: cut by f12_tool
    add(f12_tool.part, mode=Mode.SUBTRACT)


with BuildPart() as f9_1:
    add(f9.part)

    # F12: cut by f12_tool
    add(f12_tool.part, mode=Mode.SUBTRACT)


solid = Compound([f1_1.part, f7_1.part, f9_1.part])
